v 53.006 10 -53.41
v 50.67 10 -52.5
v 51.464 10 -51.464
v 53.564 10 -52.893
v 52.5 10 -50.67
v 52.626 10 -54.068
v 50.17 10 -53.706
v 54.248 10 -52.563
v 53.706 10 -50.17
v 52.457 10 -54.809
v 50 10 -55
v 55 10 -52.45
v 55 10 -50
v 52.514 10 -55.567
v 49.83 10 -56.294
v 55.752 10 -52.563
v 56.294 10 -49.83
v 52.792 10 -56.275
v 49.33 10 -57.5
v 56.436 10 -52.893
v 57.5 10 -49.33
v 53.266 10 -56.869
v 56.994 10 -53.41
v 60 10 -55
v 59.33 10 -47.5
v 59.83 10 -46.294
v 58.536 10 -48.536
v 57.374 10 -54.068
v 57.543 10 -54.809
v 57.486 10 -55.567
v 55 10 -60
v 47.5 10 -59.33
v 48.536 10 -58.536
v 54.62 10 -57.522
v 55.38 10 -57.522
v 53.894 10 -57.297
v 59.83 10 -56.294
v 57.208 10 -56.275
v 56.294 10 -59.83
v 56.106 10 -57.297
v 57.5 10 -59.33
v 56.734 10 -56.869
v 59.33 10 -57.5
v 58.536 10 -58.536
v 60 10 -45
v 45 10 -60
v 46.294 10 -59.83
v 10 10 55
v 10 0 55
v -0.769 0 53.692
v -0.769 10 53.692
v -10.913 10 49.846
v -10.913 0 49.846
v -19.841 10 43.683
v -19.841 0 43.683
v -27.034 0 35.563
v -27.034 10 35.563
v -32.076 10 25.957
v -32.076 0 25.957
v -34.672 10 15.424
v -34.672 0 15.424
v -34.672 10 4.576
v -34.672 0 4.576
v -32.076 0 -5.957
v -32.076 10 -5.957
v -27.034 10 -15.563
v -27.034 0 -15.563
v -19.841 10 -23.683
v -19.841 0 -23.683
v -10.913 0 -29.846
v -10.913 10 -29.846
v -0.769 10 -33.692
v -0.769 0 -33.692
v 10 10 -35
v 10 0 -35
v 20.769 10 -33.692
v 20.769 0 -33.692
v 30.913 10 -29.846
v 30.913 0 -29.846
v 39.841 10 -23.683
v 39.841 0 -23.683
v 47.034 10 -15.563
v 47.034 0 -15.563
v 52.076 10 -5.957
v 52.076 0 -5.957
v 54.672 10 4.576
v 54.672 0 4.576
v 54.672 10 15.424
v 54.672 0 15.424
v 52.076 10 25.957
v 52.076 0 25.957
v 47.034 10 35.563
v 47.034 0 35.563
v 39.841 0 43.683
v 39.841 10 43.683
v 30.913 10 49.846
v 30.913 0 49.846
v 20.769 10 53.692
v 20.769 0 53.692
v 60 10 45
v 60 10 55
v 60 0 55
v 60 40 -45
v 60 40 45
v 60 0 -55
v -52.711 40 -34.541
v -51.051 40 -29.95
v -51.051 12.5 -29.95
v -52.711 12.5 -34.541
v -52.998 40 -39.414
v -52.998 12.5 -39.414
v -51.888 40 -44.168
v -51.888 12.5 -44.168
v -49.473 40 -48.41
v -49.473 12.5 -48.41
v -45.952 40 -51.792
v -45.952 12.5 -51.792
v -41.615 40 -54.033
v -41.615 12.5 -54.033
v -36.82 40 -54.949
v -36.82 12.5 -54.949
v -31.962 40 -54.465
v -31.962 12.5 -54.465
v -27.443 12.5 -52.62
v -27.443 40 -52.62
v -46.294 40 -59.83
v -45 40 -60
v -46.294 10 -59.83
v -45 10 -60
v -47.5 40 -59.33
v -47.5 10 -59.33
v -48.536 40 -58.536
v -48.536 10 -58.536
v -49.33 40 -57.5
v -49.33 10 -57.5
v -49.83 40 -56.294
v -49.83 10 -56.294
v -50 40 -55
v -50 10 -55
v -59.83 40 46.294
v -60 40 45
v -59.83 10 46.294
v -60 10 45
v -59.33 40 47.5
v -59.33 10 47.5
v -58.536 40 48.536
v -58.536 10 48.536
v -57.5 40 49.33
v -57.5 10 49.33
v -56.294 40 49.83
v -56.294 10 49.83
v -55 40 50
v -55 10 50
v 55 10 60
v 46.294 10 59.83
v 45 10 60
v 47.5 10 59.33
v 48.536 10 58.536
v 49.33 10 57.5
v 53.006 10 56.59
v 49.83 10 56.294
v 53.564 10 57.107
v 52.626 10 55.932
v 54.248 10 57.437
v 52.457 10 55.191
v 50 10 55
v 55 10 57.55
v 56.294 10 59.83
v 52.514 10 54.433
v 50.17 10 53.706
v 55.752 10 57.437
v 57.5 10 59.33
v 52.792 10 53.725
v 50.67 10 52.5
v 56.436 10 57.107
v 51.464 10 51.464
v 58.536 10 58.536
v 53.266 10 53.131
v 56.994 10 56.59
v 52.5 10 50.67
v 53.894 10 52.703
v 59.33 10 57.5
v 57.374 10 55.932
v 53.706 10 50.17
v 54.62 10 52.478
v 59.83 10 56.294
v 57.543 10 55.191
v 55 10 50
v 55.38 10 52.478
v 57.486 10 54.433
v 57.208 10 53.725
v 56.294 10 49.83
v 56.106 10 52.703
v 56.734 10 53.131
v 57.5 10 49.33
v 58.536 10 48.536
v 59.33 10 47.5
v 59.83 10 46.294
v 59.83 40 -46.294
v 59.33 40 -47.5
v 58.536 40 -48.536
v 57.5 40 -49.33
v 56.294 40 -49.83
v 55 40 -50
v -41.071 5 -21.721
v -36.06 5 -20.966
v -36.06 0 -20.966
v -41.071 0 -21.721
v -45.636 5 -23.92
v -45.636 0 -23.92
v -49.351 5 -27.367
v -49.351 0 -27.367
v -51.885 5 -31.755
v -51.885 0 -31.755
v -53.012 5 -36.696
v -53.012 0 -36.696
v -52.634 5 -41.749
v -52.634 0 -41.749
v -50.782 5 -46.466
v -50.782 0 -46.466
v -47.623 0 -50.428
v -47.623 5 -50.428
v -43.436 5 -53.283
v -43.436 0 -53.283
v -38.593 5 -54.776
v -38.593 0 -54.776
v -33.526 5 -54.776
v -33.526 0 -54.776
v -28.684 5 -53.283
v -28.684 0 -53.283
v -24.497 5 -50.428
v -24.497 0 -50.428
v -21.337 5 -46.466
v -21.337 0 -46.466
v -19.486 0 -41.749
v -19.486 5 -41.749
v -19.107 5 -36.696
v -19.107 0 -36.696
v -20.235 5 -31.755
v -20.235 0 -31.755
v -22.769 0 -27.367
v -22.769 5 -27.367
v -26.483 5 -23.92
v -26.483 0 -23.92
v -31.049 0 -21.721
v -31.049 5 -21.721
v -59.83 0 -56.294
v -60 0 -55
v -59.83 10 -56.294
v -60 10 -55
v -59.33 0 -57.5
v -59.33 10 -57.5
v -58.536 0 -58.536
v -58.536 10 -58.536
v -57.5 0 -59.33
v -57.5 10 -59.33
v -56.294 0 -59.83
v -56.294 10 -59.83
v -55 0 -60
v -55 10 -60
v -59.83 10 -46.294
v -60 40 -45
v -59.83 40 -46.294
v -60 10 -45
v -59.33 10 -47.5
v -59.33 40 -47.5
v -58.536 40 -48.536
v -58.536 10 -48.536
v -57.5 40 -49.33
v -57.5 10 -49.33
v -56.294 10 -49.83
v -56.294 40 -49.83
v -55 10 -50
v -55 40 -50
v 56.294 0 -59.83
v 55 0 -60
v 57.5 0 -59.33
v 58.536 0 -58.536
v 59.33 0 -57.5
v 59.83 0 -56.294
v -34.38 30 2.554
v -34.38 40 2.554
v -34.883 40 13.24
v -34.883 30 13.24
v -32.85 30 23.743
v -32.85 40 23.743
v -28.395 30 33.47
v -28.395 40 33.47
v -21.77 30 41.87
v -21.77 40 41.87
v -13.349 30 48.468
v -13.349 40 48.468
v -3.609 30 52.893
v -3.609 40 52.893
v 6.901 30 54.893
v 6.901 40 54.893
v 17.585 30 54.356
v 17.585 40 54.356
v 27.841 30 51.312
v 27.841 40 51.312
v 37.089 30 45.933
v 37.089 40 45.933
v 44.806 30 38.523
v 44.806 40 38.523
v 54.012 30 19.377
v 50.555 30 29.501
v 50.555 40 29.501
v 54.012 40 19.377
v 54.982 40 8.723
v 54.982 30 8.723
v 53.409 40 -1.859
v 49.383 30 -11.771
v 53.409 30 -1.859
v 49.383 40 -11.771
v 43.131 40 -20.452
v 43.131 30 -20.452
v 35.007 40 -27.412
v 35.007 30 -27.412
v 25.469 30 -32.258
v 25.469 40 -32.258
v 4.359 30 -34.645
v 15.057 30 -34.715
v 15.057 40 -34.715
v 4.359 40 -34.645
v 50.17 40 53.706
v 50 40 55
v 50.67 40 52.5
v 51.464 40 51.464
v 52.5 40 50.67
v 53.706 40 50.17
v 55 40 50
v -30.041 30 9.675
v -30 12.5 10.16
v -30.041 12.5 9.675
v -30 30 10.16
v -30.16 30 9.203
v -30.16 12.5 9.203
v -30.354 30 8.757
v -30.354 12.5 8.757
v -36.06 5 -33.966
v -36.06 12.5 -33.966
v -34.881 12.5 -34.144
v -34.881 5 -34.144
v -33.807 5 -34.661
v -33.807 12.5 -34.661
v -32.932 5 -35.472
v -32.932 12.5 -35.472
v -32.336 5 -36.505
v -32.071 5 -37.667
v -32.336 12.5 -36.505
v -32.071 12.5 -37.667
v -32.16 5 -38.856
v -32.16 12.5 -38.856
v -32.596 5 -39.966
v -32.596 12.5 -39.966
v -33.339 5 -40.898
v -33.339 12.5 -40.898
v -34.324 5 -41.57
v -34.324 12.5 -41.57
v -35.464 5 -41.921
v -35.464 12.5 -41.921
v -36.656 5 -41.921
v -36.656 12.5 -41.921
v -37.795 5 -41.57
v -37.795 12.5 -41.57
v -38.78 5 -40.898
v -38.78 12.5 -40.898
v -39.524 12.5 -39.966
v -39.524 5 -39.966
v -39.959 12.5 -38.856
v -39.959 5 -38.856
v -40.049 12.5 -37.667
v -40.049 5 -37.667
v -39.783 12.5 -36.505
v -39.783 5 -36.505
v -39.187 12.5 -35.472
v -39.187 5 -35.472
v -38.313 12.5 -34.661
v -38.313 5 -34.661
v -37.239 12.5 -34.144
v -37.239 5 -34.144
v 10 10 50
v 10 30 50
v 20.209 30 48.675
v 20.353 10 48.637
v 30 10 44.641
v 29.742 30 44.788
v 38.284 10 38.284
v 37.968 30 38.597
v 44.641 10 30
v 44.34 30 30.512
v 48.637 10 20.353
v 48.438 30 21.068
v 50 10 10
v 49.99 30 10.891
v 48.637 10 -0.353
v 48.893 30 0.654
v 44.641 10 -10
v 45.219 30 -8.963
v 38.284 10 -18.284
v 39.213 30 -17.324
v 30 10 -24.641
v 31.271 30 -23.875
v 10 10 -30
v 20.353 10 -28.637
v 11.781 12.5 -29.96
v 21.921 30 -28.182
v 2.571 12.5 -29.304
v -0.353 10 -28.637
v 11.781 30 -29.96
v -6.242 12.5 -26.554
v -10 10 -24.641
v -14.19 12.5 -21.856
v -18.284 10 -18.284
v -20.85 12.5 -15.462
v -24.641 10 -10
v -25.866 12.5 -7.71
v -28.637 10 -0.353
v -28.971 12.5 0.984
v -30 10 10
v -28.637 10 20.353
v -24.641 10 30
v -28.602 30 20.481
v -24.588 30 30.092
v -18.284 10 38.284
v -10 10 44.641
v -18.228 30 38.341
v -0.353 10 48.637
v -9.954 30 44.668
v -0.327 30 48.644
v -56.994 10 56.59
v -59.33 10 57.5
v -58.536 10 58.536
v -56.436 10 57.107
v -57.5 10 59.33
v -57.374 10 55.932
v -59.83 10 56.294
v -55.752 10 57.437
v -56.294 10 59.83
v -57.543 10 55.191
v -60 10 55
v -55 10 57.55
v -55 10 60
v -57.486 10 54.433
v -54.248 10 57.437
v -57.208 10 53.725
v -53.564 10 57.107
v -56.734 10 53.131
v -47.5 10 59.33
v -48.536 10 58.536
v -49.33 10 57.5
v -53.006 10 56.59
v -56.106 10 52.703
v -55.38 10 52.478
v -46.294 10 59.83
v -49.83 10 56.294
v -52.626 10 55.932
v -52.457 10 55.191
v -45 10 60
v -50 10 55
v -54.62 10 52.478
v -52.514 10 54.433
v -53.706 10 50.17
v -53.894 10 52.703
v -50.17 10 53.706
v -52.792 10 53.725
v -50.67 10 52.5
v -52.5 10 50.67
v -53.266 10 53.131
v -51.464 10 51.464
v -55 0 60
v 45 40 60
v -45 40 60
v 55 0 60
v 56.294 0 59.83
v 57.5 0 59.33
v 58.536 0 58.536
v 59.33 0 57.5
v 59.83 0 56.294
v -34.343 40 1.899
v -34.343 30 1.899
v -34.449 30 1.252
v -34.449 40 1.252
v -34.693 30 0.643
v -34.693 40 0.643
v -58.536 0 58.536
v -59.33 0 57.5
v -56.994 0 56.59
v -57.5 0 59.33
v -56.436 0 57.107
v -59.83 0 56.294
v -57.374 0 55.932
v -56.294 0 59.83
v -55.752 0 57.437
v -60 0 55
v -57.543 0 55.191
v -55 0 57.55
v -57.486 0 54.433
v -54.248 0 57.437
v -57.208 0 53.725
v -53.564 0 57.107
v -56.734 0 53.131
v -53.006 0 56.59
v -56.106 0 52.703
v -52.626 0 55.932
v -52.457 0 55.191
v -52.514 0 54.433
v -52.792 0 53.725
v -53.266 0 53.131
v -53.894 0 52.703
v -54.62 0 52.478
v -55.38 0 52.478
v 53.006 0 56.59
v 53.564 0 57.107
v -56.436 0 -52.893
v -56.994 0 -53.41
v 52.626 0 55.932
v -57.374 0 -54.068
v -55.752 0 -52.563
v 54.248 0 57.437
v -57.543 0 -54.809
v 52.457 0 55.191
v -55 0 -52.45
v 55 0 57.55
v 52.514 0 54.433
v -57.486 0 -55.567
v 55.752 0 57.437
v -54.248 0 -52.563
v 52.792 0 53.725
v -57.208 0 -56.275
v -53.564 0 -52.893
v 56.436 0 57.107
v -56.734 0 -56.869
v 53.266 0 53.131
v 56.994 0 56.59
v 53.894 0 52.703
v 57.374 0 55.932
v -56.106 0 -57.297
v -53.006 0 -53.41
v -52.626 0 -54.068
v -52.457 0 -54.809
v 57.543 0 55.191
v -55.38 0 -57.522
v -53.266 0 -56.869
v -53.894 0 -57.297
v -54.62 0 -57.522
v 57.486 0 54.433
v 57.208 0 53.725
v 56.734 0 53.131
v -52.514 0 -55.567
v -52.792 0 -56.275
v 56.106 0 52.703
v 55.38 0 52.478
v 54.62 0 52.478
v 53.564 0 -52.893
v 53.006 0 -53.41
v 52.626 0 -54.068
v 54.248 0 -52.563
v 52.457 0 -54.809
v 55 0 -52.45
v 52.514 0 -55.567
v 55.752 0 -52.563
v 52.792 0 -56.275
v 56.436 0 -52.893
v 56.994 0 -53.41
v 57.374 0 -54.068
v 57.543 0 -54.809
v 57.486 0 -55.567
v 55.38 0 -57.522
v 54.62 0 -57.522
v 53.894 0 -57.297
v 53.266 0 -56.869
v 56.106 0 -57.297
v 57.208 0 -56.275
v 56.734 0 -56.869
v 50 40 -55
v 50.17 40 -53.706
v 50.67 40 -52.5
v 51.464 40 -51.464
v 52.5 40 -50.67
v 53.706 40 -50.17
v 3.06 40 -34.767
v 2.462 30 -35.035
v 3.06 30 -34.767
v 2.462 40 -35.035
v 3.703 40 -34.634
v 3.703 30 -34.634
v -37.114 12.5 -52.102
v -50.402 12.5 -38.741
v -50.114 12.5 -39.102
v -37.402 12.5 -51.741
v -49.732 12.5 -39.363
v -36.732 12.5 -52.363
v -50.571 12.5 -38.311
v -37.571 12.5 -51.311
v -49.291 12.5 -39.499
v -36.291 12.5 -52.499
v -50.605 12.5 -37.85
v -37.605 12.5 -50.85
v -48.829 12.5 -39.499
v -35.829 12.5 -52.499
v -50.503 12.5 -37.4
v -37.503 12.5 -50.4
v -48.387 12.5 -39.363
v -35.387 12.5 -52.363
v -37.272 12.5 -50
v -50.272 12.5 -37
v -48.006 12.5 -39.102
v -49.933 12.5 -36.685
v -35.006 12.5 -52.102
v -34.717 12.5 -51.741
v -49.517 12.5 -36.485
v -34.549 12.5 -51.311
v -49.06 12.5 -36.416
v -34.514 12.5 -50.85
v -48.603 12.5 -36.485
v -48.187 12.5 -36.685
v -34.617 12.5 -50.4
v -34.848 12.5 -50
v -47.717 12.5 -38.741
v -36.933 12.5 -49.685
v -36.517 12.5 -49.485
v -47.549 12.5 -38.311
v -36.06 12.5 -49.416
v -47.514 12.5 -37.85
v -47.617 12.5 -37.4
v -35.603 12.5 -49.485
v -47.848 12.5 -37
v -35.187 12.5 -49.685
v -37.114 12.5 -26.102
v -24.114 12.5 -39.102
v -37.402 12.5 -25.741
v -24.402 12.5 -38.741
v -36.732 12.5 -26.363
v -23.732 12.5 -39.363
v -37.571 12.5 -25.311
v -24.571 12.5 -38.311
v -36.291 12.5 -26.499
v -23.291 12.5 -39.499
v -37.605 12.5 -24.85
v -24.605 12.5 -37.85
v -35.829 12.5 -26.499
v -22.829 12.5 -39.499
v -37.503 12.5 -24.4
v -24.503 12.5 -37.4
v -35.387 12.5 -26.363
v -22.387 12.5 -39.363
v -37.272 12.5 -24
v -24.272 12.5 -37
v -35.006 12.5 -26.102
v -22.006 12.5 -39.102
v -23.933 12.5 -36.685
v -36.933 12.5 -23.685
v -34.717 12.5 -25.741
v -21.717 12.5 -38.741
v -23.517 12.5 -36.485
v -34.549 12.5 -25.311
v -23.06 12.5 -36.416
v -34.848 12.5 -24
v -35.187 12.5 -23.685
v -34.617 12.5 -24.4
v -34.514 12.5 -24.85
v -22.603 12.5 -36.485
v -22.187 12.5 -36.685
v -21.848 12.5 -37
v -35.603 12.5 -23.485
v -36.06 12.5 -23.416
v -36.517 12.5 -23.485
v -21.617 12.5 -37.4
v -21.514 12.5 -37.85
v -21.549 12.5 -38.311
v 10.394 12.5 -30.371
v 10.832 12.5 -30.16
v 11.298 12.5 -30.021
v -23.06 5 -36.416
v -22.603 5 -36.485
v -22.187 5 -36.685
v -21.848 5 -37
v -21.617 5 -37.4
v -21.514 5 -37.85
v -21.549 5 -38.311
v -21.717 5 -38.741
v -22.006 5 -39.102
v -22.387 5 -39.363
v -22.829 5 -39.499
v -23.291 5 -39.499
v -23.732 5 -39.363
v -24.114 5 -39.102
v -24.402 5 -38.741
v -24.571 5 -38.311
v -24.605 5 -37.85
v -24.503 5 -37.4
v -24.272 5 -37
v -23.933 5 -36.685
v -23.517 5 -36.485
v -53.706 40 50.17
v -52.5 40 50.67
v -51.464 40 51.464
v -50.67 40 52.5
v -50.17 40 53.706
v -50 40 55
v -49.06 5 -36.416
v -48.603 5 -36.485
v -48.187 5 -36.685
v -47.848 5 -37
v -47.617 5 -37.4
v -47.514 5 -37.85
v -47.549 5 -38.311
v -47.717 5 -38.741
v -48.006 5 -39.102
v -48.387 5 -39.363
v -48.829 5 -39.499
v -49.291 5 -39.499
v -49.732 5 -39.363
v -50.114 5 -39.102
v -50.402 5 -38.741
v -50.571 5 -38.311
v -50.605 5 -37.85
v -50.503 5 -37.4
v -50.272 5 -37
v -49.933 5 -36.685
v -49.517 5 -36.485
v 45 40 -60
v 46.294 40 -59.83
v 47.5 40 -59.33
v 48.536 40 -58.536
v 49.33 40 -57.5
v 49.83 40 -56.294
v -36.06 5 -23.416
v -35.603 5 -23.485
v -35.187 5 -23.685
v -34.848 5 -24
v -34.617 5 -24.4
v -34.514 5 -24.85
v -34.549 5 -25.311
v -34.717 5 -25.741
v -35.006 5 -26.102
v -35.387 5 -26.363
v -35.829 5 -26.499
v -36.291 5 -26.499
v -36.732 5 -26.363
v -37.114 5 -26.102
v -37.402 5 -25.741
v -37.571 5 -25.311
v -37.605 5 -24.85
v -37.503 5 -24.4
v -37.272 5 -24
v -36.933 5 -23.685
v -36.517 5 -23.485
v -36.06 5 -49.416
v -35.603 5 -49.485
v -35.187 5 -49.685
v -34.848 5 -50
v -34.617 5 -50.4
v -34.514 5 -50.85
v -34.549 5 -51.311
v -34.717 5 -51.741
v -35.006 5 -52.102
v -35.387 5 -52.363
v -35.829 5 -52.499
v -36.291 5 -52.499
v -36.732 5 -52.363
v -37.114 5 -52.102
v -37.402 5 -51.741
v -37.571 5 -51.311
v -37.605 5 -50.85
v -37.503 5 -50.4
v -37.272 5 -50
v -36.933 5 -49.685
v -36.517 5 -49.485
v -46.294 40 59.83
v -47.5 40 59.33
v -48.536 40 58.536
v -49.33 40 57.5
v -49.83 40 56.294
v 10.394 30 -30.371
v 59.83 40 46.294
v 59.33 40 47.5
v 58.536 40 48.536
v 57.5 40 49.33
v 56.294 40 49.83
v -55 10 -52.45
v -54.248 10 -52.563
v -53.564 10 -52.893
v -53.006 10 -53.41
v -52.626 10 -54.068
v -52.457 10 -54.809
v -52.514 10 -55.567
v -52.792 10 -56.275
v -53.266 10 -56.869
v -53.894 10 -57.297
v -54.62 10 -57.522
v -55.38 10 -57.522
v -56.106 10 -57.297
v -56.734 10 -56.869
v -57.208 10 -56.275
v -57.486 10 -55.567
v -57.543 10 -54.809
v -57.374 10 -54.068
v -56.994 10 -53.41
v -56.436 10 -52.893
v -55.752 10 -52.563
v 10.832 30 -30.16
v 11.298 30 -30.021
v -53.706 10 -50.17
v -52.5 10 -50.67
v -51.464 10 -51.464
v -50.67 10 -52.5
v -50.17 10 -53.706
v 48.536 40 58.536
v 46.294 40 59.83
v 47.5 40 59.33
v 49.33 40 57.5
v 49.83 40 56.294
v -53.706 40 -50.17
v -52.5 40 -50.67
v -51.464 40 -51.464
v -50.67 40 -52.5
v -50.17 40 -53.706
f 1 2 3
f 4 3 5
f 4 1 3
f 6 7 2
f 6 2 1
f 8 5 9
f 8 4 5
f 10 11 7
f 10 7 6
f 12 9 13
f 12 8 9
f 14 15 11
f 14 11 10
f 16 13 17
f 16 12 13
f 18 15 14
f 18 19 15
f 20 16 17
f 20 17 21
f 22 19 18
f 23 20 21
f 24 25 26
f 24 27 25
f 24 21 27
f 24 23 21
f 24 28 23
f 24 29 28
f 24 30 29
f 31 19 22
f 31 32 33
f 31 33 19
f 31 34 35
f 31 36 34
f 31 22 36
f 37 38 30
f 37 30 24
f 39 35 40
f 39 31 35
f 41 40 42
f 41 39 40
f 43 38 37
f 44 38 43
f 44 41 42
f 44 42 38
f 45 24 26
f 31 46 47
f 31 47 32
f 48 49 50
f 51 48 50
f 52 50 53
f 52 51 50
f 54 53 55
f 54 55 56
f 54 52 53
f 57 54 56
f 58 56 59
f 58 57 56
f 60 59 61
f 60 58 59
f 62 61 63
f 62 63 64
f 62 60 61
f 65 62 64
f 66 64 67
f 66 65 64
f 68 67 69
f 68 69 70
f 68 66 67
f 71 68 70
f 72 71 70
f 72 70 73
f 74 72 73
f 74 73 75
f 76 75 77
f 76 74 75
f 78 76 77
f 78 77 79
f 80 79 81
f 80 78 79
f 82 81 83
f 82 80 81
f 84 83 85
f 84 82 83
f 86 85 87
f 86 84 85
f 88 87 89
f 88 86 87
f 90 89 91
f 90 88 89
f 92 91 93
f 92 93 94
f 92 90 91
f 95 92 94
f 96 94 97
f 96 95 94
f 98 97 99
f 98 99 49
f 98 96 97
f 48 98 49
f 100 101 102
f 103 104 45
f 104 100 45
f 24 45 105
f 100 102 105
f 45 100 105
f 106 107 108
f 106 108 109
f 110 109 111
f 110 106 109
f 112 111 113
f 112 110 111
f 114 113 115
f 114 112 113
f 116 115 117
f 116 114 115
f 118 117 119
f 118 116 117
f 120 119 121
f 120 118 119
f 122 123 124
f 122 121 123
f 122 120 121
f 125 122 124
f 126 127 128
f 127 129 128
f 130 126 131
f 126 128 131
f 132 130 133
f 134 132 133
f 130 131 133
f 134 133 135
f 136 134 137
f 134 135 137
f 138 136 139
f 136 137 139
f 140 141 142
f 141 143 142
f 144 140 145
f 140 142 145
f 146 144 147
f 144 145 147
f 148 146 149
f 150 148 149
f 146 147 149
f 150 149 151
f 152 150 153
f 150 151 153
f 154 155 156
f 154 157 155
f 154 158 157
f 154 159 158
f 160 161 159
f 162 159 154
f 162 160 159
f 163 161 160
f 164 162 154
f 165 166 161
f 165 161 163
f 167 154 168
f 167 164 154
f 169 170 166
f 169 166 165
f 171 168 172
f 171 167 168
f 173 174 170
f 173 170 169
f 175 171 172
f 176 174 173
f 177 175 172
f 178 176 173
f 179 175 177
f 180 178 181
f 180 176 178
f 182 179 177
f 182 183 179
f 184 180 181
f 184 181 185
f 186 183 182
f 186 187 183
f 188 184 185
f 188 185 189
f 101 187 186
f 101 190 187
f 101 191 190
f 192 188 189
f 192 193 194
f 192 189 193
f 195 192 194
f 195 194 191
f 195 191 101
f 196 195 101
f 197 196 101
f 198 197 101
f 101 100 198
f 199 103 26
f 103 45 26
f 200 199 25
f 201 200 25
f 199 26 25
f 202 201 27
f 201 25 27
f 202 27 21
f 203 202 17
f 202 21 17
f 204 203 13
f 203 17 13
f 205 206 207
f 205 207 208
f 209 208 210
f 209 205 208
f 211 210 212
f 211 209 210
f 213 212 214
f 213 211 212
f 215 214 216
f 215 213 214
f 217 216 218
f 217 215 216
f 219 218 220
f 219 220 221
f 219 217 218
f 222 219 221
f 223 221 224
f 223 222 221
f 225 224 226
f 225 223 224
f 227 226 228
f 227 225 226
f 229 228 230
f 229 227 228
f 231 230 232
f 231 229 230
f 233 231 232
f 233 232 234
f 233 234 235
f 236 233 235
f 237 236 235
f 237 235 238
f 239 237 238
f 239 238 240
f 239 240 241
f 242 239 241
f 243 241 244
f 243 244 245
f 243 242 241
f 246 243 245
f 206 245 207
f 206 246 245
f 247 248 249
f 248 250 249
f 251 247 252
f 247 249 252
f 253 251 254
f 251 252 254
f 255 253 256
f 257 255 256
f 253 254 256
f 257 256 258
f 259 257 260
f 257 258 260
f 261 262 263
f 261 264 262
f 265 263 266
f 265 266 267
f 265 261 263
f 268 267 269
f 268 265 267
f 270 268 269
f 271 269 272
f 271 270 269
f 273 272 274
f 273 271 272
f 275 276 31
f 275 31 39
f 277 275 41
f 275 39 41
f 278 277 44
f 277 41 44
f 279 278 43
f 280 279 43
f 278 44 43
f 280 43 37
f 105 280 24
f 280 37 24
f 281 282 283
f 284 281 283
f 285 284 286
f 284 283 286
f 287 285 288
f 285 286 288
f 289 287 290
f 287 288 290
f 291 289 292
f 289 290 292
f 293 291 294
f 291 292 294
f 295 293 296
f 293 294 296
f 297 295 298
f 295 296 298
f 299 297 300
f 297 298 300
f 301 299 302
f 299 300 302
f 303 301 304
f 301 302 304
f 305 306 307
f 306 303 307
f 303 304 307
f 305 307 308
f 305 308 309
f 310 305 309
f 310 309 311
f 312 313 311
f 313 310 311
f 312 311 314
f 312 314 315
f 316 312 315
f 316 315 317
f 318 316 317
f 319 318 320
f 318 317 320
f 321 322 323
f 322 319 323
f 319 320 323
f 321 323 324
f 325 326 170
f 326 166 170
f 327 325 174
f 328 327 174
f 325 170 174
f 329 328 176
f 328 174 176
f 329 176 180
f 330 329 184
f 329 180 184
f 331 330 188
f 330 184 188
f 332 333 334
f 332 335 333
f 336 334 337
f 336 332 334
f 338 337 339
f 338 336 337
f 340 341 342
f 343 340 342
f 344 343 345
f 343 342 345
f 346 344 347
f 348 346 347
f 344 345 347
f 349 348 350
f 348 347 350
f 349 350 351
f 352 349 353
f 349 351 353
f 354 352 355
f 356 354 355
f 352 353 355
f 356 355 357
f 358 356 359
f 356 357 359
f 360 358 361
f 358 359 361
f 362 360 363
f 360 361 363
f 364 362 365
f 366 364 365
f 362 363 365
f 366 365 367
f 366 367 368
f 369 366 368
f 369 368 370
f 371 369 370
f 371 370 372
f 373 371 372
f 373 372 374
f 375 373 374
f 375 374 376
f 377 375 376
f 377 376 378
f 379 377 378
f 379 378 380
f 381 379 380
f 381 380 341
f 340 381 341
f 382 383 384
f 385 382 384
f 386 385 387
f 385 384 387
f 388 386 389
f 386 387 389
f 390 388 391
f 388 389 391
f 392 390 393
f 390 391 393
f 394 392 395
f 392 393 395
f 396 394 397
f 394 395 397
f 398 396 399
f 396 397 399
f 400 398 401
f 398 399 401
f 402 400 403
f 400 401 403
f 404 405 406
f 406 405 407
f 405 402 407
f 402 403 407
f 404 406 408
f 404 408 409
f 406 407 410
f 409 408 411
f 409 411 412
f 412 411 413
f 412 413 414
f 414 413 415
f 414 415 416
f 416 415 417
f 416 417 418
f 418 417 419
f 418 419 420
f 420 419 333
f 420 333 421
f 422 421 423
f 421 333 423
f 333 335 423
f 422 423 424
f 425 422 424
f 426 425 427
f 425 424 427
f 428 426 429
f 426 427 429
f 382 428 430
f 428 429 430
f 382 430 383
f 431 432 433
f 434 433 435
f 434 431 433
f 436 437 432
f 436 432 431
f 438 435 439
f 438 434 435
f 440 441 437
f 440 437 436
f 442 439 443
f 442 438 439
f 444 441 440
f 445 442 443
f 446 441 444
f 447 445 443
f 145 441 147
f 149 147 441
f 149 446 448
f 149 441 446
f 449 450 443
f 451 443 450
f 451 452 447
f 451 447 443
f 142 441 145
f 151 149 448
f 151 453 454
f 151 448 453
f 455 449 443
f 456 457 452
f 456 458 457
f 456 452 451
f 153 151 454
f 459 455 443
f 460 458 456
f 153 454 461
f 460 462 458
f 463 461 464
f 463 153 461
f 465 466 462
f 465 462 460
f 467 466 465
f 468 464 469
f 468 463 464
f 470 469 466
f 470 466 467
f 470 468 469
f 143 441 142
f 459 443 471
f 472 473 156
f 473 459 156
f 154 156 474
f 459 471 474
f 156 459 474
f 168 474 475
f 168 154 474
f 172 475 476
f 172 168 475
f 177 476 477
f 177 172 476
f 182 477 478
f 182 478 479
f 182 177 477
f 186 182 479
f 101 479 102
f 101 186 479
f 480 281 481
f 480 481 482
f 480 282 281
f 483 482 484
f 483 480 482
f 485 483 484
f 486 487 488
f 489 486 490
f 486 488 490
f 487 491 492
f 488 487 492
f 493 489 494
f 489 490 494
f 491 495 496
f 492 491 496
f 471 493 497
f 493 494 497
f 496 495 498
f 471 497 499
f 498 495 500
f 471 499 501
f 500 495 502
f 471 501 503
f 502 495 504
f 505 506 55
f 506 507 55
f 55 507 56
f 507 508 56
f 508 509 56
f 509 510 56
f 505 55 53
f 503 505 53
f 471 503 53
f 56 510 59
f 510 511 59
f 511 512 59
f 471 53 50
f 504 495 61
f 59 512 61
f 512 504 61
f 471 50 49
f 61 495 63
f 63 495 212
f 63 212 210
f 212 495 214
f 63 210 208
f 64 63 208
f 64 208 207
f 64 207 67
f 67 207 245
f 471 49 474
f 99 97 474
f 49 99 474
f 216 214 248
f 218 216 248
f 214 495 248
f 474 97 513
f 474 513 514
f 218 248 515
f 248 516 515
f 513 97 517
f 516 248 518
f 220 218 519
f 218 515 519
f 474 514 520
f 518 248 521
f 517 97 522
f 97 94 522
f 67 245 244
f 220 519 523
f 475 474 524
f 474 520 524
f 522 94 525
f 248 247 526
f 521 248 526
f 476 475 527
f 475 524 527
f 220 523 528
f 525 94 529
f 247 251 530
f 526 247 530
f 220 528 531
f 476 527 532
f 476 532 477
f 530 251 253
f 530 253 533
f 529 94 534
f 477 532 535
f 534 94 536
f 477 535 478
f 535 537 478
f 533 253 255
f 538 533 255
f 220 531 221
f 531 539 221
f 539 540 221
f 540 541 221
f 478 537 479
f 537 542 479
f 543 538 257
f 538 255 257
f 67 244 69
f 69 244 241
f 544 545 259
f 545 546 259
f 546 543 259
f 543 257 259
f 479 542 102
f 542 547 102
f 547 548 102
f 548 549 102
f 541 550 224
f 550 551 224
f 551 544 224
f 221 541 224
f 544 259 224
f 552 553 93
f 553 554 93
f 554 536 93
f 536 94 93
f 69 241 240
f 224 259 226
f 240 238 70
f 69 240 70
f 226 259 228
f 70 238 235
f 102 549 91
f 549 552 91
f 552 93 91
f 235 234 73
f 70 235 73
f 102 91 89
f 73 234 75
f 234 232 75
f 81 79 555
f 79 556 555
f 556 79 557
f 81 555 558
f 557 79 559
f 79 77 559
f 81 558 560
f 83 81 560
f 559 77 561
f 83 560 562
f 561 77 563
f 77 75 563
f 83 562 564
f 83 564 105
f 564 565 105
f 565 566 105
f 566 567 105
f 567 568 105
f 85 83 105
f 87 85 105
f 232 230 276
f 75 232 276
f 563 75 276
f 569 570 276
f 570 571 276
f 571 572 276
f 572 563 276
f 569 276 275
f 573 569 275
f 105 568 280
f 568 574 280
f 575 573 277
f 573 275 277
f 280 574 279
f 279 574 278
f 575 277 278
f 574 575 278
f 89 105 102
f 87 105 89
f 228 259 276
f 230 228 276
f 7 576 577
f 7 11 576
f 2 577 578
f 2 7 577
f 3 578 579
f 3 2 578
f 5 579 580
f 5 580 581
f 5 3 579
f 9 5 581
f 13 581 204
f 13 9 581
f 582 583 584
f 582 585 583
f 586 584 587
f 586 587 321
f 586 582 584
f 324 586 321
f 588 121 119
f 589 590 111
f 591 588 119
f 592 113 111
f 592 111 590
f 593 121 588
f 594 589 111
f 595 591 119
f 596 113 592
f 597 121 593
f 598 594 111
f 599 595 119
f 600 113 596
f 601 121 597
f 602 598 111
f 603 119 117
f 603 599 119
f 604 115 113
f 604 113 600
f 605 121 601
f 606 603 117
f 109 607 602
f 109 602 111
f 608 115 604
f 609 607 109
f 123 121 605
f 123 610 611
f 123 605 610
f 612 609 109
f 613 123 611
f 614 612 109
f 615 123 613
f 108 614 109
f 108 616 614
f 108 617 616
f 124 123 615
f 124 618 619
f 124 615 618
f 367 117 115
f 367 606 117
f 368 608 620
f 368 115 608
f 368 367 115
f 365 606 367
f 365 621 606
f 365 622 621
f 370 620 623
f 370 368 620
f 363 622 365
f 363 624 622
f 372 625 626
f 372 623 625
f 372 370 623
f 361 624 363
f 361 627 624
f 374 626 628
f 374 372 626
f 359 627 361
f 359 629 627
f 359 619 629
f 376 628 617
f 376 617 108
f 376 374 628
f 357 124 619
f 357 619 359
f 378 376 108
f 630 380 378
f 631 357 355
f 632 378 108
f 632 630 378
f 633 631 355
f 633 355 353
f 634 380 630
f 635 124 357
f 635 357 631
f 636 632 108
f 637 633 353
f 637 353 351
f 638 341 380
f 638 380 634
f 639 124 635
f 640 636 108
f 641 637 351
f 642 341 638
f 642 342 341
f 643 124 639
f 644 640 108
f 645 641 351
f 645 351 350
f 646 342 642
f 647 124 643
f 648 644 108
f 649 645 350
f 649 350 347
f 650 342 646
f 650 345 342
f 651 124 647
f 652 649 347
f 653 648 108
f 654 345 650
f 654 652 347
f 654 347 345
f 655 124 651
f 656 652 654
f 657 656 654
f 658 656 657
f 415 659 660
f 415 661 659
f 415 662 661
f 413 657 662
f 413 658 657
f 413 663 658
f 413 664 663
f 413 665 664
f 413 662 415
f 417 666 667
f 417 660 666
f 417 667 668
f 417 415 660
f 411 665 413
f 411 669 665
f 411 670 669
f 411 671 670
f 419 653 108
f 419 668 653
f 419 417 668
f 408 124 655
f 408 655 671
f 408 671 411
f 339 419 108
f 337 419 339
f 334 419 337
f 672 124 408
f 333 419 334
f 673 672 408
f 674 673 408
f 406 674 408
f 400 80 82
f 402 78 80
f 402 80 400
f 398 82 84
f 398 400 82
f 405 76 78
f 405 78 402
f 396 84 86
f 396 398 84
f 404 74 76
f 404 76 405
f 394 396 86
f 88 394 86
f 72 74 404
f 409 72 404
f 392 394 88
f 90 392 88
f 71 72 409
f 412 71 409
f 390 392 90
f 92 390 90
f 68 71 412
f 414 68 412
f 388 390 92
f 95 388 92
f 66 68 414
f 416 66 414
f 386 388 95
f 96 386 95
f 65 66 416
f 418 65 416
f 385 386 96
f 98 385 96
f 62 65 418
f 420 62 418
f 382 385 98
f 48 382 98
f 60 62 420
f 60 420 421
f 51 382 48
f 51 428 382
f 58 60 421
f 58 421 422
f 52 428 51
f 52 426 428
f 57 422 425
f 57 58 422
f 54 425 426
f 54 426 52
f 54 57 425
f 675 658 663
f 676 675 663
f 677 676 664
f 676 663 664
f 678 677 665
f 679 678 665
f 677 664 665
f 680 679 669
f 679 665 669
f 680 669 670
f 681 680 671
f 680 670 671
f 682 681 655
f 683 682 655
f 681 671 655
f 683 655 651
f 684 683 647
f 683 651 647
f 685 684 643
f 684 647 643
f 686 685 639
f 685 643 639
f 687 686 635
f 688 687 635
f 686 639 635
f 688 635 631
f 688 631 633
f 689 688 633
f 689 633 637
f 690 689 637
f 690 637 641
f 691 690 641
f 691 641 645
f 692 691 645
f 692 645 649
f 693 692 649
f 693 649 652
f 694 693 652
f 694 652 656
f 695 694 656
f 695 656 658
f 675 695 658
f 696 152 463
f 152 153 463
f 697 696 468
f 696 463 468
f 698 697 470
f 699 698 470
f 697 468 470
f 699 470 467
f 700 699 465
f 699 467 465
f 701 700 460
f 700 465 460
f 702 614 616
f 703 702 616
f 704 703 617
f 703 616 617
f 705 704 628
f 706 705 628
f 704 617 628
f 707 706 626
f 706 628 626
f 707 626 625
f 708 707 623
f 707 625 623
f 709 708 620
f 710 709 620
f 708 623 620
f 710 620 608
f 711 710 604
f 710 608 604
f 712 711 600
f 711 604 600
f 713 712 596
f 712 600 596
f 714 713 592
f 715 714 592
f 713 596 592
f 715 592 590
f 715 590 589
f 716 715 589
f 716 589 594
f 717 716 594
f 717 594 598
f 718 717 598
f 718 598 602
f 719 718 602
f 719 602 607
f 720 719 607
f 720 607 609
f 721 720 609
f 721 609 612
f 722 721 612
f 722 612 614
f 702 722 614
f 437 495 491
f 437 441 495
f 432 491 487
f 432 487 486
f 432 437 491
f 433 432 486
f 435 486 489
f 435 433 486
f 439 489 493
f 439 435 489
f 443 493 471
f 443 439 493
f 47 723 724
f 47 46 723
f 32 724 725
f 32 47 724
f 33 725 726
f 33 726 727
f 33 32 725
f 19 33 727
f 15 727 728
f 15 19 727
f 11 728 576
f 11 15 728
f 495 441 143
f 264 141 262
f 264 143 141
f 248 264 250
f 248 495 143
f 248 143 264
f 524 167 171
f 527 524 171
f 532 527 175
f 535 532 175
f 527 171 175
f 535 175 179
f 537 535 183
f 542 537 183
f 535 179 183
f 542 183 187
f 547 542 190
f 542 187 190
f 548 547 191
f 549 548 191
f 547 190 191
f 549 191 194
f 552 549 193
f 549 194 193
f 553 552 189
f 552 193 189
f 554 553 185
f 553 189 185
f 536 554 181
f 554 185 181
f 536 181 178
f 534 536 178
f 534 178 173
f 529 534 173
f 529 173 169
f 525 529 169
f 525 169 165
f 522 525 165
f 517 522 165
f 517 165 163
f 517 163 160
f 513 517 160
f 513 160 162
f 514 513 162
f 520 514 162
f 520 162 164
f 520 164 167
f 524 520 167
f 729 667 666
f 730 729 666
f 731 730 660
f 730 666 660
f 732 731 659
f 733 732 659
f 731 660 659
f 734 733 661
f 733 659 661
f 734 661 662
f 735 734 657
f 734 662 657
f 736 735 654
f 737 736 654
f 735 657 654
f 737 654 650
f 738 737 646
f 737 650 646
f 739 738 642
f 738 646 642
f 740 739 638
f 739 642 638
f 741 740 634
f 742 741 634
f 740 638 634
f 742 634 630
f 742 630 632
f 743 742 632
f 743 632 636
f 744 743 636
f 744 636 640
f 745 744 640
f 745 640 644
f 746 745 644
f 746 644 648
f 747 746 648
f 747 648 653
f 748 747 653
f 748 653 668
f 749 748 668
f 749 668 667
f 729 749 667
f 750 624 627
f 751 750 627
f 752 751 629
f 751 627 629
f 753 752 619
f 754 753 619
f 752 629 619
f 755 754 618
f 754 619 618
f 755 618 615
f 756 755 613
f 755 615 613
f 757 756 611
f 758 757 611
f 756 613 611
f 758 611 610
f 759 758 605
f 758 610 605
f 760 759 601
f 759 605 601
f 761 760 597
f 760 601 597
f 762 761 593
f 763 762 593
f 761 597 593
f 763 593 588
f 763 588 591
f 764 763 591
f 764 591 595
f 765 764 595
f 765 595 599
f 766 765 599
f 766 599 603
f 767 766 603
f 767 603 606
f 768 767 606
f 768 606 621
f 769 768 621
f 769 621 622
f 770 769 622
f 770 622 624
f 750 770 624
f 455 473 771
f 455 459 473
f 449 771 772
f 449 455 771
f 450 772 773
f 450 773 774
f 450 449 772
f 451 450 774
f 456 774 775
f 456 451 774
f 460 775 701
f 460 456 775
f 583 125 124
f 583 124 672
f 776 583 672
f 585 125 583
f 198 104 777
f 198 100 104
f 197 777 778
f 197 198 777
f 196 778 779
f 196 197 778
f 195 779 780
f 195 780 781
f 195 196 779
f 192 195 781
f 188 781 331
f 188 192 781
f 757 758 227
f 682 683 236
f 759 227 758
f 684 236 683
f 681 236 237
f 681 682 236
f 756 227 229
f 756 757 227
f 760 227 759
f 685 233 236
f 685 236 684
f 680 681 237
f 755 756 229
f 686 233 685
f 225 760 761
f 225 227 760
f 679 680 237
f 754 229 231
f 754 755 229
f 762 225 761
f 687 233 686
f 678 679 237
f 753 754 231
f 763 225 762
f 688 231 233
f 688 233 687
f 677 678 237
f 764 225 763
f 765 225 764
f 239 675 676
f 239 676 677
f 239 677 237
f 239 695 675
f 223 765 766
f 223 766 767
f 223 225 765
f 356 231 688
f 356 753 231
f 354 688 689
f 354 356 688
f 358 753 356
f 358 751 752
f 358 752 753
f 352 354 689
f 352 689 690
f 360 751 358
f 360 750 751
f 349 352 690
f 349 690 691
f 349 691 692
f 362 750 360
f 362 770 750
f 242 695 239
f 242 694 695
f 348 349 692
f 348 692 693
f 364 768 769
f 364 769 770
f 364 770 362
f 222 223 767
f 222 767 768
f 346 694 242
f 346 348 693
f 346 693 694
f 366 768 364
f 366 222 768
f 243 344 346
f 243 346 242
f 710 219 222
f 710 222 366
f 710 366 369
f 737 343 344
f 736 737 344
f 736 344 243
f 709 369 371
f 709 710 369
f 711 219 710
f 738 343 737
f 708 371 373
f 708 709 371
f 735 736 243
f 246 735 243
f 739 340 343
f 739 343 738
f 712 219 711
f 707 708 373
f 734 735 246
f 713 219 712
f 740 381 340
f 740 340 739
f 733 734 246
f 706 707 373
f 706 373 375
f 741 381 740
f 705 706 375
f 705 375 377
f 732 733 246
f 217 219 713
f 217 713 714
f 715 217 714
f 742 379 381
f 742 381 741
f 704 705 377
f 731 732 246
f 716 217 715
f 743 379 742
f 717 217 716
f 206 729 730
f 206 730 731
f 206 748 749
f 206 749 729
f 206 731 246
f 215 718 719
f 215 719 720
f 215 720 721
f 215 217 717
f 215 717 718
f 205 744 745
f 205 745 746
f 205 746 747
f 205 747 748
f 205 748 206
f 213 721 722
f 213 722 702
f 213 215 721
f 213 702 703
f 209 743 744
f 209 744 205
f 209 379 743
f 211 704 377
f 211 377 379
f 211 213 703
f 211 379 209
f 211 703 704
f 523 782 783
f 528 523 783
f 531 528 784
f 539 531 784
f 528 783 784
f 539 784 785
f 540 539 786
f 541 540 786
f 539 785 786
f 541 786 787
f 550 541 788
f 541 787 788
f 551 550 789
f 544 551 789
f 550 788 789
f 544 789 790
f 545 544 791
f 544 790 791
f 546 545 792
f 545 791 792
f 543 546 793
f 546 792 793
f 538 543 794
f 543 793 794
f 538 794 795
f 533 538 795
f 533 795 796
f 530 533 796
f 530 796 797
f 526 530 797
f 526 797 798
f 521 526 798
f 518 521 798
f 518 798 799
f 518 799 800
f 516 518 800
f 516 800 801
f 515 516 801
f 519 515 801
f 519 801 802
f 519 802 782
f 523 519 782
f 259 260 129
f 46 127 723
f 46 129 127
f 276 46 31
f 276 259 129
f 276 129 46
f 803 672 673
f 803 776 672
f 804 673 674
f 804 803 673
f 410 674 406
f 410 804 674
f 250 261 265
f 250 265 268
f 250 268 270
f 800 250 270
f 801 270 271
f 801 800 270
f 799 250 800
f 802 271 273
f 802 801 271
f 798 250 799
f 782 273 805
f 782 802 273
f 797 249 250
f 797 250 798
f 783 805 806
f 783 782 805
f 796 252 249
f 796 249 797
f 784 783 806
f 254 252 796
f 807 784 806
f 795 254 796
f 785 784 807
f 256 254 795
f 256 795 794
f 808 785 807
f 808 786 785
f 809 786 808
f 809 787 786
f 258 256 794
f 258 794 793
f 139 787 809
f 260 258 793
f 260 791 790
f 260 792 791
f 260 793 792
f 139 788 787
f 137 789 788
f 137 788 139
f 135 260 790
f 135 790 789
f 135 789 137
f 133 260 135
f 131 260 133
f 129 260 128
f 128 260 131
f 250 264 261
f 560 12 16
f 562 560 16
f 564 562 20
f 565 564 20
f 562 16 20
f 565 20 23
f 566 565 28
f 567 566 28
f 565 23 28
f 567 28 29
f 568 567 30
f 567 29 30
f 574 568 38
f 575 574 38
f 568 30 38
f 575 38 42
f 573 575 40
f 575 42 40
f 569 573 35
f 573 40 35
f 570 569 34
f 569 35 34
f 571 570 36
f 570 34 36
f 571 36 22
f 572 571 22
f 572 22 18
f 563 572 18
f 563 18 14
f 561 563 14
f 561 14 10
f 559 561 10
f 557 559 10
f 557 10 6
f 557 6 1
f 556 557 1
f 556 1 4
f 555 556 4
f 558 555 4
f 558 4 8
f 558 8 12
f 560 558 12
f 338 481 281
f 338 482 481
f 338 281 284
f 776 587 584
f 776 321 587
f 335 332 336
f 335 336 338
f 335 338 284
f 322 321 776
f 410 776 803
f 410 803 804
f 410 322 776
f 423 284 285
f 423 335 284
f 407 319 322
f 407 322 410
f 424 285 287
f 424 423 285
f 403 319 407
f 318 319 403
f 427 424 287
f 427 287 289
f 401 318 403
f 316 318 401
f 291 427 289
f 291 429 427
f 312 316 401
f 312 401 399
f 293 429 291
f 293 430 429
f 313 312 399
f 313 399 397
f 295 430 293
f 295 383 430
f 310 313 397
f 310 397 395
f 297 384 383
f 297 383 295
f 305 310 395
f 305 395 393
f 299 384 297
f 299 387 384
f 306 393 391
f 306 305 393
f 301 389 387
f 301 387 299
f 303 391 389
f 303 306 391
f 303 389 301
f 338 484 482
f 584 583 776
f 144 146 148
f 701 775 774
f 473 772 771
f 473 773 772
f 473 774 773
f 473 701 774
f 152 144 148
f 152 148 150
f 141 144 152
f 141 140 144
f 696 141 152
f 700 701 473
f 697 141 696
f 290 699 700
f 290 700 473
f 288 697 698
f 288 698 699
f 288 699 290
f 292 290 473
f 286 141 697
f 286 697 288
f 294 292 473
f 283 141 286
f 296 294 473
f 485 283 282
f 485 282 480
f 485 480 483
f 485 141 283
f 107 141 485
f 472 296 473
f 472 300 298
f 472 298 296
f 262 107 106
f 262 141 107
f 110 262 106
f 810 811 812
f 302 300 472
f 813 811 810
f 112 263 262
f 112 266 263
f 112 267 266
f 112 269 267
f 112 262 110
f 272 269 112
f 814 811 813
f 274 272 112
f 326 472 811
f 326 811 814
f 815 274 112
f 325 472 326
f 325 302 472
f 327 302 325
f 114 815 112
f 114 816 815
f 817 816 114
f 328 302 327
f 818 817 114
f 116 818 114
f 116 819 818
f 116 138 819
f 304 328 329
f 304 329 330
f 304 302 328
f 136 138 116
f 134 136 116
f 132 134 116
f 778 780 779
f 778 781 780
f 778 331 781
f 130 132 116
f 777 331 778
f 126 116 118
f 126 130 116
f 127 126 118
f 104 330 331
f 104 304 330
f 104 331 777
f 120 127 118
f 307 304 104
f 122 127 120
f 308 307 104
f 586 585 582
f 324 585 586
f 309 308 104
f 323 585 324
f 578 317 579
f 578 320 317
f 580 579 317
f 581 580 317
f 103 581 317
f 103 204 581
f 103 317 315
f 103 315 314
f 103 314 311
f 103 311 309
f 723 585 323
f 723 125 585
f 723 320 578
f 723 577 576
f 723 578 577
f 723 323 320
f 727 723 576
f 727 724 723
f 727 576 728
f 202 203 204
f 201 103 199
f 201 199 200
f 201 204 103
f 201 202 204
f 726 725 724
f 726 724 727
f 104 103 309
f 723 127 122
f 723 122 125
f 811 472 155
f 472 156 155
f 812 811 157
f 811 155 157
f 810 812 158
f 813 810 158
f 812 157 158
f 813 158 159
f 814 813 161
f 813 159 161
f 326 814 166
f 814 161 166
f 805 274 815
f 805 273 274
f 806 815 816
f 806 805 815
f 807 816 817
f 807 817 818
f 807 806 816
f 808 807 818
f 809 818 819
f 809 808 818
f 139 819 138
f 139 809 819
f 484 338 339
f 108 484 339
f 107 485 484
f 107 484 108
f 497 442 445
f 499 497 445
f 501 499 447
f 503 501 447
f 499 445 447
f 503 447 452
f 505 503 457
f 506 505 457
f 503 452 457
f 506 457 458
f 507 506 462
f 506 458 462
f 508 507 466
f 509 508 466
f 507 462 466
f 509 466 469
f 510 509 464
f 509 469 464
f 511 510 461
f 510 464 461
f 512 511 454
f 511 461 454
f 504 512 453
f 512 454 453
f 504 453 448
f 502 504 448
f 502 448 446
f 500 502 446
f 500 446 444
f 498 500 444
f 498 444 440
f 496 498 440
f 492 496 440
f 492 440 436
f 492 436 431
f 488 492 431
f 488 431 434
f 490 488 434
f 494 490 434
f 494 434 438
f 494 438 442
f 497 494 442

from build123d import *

# Parameters (mm, degrees)
SKETCH1_W           = 120
SKETCH1_H           = 120
BOSS_EXTRUDE1_DEPTH = 40
SKETCH2_R           = 40
CUT_EXTRUDE1_DEPTH  = 94.808315196
SKETCH3_R           = 45
CUT_EXTRUDE2_DEPTH  = 10
CUT_EXTRUDE3_START  = -10
SKETCH4_R           = 45
CUT_EXTRUDE3_DEPTH  = 10
SKETCH11_W          = 10
SKETCH11_H          = 10
CUT_EXTRUDE8_DEPTH  = 30
SKETCH7_R           = 17
CUT_EXTRUDE5_DEPTH  = 27.5
CUT_EXTRUDE10_START = -5
SKETCH13_R          = 17
CUT_EXTRUDE10_DEPTH = 5
SKETCH14_R          = 4
SKETCH14_R_2        = 1.55
CUT_EXTRUDE11_DEPTH = 90.197813875
CUT_EXTRUDE7_REACH  = 95.808
SKETCH12_R          = 2.55
CUT_EXTRUDE9_DEPTH  = 91
FILLET1_R           = 5
FILLET2_R           = 5
FILLET3_R           = 3


with BuildPart() as part:
    # Sketch1 → Boss-Extrude1 (new body)
    with BuildSketch(Plane(origin=(0, 0, 0), x_dir=(1, 0, 0), z_dir=(0, 1, 0))):
        Rectangle(SKETCH1_W, SKETCH1_H)
    extrude(amount=BOSS_EXTRUDE1_DEPTH)

    # Sketch2 → Cut-Extrude1 (cut, through all)
    with BuildSketch(Plane(origin=(0, 40, 0), x_dir=(1, 0, 0), z_dir=(0, 1, 0))):
        with Locations(Location((10, -10, 0), (0, 0, 270))):
            Circle(SKETCH2_R)
    extrude(amount=-CUT_EXTRUDE1_DEPTH, mode=Mode.SUBTRACT)

    # Sketch3 → Cut-Extrude2 (cut)
    with BuildSketch(Plane(origin=(0, 40, 0), x_dir=(1, 0, 0), z_dir=(0, 1, 0))):
        with Locations(Location((10, -10, 0), (0, 0, 270))):
            Circle(SKETCH3_R)
    extrude(amount=-CUT_EXTRUDE2_DEPTH, mode=Mode.SUBTRACT)

    # Sketch4 → Cut-Extrude3 (cut)
    with BuildSketch(Plane.XZ.offset(CUT_EXTRUDE3_START)):
        with Locations(Location((10, 10, 0), (0, 0, 90))):
            Circle(SKETCH4_R)
    extrude(amount=CUT_EXTRUDE3_DEPTH, mode=Mode.SUBTRACT)

    # Sketch11 → Cut-Extrude8 (cut)
    with BuildSketch(Plane(origin=(0, 40, 0), x_dir=(1, 0, 0), z_dir=(0, 1, 0))):
        with Locations((-55, 55)):
            Rectangle(SKETCH11_W, SKETCH11_H)
        with Locations((55, 55)):
            Rectangle(SKETCH11_W, SKETCH11_H)
        with Locations((55, -55)):
            Rectangle(SKETCH11_W, SKETCH11_H)
        with Locations((-55, -55)):
            Rectangle(SKETCH11_W, SKETCH11_H)
    extrude(amount=-CUT_EXTRUDE8_DEPTH, mode=Mode.SUBTRACT)

    # Sketch7 → Cut-Extrude5 (cut)
    with BuildSketch(Plane(origin=(0, 40, 0), x_dir=(1, 0, 0), z_dir=(0, 1, 0))):
        with Locations(Location((-36.059780402, 37.96609875, 0), (0, 0, 270))):
            Circle(SKETCH7_R)
    extrude(amount=-CUT_EXTRUDE5_DEPTH, mode=Mode.SUBTRACT)

    # Sketch13 → Cut-Extrude10 (cut)
    with BuildSketch(Plane.XZ.offset(CUT_EXTRUDE10_START)):
        with Locations(Location((-36.059780402, -37.96609875, 0), (0, 0, 90))):
            Circle(SKETCH13_R)
    extrude(amount=CUT_EXTRUDE10_DEPTH, mode=Mode.SUBTRACT)

    # Sketch14 → Cut-Extrude11 (cut, through all)
    with BuildSketch(Plane(origin=(0, 12.5, 0), x_dir=(1, 0, 0), z_dir=(0, 1, 0))):
        with Locations(Location((-36.059780402, 37.96609875, 0), (0, 0, 270))):
            Circle(SKETCH14_R)
        with Locations(Location((-36.059780402, 50.96609875, 0), (0, 0, 270))):
            Circle(SKETCH14_R_2)
        with Locations(Location((-23.059780402, 37.96609875, 0), (0, 0, 270))):
            Circle(SKETCH14_R_2)
        with Locations(Location((-36.059780402, 24.96609875, 0), (0, 0, 270))):
            Circle(SKETCH14_R_2)
        with Locations(Location((-49.059780402, 37.96609875, 0), (0, 0, 270))):
            Circle(SKETCH14_R_2)
    extrude(amount=-CUT_EXTRUDE11_DEPTH, mode=Mode.SUBTRACT)

    # Cut-Extrude7: up to this face of the body (flat: up to its plane)
    cut_extrude7_end = Plane(part.part.faces().sort_by_distance((-36.059780402, 12.5, -54.485266139))[0])
    # Sketch10 → Cut-Extrude7 (cut, up to the picked face)
    with BuildSketch(Plane(origin=(0, 40, 0), x_dir=(1, 0, 0), z_dir=(0, 1, 0)), mode=Mode.PRIVATE) as cut_extrude7_sk1:
        with BuildLine():
            Line((-27.442638837, 52.620274648), (27.741173812, 20.170362142))
            ThreePointArc((27.741173812, 20.170362142), (34.241989685, -35.245315132), (-20.864656949, -26.503725379))
            Line((-20.864656949, -26.503725379), (-51.051185206, 29.950003566))
            ThreePointArc((-51.051185206, 29.950003566), (-47.834461107, 50.228108957), (-27.442638837, 52.620274648))
        make_face()
    cut_extrude7_tool1 = split(extrude(cut_extrude7_sk1.sketch, amount=-CUT_EXTRUDE7_REACH, mode=Mode.PRIVATE), bisect_by=cut_extrude7_end, keep=Keep.BOTH, mode=Mode.PRIVATE)
    add(cut_extrude7_tool1.solids().sort_by(Axis((-2.85152, 40, -3.383418), (0, -1, 0)))[0], mode=Mode.SUBTRACT)

    # Sketch12 → Cut-Extrude9 (cut, through all)
    with BuildSketch(Plane(origin=(0, 10, 0), x_dir=(1, 0, 0), z_dir=(0, 1, 0))):
        with Locations(Location((-55, 55, 0), (0, 0, 270))):
            Circle(SKETCH12_R)
        with Locations(Location((55, 55, 0), (0, 0, 270))):
            Circle(SKETCH12_R)
        with Locations(Location((55, -55, 0), (0, 0, 270))):
            Circle(SKETCH12_R)
        with Locations(Location((-55, -55, 0), (0, 0, 270))):
            Circle(SKETCH12_R)
    extrude(amount=-CUT_EXTRUDE9_DEPTH, mode=Mode.SUBTRACT)

    # Fillet1
    fillet1_edges = [part.edges().sort_by_distance(p)[0] for p in [
        (-60, 5, -60),
        (-50, 25, -50),
        (60, 5, -60),
        (50, 25, -50),
        (60, 5, 60),
        (50, 25, 50),
        (-60, 5, 60),
        (-50, 25, 50),
    ]]
    fillet(fillet1_edges, radius=FILLET1_R)

    # Fillet2
    fillet2_edges = [part.edges().sort_by_distance(p)[0] for p in [
        (50, 25, -60),
        (60, 25, -50),
        (60, 25, 50),
        (-50, 25, 60),
        (-60, 25, 50),
        (-50, 25, -60),
        (-60, 25, -50),
        (50, 25, 60),
    ]]
    fillet(fillet2_edges, radius=FILLET2_R - 0.0001)  # a hair under: the kernel refuses the full size

    # Fillet3
    fillet3_edges = [part.edges().sort_by_distance(p)[0] for p in [
        (-29.99589317, 21.25, 9.426825043),
        (-34.201681099, 35, 1.561315976),
        (11.048415222, 21.25, -29.986257958),
        (3.359839341, 35, -34.507395637),
    ]]
    fillet(fillet3_edges, radius=FILLET3_R)


solid = part.part
